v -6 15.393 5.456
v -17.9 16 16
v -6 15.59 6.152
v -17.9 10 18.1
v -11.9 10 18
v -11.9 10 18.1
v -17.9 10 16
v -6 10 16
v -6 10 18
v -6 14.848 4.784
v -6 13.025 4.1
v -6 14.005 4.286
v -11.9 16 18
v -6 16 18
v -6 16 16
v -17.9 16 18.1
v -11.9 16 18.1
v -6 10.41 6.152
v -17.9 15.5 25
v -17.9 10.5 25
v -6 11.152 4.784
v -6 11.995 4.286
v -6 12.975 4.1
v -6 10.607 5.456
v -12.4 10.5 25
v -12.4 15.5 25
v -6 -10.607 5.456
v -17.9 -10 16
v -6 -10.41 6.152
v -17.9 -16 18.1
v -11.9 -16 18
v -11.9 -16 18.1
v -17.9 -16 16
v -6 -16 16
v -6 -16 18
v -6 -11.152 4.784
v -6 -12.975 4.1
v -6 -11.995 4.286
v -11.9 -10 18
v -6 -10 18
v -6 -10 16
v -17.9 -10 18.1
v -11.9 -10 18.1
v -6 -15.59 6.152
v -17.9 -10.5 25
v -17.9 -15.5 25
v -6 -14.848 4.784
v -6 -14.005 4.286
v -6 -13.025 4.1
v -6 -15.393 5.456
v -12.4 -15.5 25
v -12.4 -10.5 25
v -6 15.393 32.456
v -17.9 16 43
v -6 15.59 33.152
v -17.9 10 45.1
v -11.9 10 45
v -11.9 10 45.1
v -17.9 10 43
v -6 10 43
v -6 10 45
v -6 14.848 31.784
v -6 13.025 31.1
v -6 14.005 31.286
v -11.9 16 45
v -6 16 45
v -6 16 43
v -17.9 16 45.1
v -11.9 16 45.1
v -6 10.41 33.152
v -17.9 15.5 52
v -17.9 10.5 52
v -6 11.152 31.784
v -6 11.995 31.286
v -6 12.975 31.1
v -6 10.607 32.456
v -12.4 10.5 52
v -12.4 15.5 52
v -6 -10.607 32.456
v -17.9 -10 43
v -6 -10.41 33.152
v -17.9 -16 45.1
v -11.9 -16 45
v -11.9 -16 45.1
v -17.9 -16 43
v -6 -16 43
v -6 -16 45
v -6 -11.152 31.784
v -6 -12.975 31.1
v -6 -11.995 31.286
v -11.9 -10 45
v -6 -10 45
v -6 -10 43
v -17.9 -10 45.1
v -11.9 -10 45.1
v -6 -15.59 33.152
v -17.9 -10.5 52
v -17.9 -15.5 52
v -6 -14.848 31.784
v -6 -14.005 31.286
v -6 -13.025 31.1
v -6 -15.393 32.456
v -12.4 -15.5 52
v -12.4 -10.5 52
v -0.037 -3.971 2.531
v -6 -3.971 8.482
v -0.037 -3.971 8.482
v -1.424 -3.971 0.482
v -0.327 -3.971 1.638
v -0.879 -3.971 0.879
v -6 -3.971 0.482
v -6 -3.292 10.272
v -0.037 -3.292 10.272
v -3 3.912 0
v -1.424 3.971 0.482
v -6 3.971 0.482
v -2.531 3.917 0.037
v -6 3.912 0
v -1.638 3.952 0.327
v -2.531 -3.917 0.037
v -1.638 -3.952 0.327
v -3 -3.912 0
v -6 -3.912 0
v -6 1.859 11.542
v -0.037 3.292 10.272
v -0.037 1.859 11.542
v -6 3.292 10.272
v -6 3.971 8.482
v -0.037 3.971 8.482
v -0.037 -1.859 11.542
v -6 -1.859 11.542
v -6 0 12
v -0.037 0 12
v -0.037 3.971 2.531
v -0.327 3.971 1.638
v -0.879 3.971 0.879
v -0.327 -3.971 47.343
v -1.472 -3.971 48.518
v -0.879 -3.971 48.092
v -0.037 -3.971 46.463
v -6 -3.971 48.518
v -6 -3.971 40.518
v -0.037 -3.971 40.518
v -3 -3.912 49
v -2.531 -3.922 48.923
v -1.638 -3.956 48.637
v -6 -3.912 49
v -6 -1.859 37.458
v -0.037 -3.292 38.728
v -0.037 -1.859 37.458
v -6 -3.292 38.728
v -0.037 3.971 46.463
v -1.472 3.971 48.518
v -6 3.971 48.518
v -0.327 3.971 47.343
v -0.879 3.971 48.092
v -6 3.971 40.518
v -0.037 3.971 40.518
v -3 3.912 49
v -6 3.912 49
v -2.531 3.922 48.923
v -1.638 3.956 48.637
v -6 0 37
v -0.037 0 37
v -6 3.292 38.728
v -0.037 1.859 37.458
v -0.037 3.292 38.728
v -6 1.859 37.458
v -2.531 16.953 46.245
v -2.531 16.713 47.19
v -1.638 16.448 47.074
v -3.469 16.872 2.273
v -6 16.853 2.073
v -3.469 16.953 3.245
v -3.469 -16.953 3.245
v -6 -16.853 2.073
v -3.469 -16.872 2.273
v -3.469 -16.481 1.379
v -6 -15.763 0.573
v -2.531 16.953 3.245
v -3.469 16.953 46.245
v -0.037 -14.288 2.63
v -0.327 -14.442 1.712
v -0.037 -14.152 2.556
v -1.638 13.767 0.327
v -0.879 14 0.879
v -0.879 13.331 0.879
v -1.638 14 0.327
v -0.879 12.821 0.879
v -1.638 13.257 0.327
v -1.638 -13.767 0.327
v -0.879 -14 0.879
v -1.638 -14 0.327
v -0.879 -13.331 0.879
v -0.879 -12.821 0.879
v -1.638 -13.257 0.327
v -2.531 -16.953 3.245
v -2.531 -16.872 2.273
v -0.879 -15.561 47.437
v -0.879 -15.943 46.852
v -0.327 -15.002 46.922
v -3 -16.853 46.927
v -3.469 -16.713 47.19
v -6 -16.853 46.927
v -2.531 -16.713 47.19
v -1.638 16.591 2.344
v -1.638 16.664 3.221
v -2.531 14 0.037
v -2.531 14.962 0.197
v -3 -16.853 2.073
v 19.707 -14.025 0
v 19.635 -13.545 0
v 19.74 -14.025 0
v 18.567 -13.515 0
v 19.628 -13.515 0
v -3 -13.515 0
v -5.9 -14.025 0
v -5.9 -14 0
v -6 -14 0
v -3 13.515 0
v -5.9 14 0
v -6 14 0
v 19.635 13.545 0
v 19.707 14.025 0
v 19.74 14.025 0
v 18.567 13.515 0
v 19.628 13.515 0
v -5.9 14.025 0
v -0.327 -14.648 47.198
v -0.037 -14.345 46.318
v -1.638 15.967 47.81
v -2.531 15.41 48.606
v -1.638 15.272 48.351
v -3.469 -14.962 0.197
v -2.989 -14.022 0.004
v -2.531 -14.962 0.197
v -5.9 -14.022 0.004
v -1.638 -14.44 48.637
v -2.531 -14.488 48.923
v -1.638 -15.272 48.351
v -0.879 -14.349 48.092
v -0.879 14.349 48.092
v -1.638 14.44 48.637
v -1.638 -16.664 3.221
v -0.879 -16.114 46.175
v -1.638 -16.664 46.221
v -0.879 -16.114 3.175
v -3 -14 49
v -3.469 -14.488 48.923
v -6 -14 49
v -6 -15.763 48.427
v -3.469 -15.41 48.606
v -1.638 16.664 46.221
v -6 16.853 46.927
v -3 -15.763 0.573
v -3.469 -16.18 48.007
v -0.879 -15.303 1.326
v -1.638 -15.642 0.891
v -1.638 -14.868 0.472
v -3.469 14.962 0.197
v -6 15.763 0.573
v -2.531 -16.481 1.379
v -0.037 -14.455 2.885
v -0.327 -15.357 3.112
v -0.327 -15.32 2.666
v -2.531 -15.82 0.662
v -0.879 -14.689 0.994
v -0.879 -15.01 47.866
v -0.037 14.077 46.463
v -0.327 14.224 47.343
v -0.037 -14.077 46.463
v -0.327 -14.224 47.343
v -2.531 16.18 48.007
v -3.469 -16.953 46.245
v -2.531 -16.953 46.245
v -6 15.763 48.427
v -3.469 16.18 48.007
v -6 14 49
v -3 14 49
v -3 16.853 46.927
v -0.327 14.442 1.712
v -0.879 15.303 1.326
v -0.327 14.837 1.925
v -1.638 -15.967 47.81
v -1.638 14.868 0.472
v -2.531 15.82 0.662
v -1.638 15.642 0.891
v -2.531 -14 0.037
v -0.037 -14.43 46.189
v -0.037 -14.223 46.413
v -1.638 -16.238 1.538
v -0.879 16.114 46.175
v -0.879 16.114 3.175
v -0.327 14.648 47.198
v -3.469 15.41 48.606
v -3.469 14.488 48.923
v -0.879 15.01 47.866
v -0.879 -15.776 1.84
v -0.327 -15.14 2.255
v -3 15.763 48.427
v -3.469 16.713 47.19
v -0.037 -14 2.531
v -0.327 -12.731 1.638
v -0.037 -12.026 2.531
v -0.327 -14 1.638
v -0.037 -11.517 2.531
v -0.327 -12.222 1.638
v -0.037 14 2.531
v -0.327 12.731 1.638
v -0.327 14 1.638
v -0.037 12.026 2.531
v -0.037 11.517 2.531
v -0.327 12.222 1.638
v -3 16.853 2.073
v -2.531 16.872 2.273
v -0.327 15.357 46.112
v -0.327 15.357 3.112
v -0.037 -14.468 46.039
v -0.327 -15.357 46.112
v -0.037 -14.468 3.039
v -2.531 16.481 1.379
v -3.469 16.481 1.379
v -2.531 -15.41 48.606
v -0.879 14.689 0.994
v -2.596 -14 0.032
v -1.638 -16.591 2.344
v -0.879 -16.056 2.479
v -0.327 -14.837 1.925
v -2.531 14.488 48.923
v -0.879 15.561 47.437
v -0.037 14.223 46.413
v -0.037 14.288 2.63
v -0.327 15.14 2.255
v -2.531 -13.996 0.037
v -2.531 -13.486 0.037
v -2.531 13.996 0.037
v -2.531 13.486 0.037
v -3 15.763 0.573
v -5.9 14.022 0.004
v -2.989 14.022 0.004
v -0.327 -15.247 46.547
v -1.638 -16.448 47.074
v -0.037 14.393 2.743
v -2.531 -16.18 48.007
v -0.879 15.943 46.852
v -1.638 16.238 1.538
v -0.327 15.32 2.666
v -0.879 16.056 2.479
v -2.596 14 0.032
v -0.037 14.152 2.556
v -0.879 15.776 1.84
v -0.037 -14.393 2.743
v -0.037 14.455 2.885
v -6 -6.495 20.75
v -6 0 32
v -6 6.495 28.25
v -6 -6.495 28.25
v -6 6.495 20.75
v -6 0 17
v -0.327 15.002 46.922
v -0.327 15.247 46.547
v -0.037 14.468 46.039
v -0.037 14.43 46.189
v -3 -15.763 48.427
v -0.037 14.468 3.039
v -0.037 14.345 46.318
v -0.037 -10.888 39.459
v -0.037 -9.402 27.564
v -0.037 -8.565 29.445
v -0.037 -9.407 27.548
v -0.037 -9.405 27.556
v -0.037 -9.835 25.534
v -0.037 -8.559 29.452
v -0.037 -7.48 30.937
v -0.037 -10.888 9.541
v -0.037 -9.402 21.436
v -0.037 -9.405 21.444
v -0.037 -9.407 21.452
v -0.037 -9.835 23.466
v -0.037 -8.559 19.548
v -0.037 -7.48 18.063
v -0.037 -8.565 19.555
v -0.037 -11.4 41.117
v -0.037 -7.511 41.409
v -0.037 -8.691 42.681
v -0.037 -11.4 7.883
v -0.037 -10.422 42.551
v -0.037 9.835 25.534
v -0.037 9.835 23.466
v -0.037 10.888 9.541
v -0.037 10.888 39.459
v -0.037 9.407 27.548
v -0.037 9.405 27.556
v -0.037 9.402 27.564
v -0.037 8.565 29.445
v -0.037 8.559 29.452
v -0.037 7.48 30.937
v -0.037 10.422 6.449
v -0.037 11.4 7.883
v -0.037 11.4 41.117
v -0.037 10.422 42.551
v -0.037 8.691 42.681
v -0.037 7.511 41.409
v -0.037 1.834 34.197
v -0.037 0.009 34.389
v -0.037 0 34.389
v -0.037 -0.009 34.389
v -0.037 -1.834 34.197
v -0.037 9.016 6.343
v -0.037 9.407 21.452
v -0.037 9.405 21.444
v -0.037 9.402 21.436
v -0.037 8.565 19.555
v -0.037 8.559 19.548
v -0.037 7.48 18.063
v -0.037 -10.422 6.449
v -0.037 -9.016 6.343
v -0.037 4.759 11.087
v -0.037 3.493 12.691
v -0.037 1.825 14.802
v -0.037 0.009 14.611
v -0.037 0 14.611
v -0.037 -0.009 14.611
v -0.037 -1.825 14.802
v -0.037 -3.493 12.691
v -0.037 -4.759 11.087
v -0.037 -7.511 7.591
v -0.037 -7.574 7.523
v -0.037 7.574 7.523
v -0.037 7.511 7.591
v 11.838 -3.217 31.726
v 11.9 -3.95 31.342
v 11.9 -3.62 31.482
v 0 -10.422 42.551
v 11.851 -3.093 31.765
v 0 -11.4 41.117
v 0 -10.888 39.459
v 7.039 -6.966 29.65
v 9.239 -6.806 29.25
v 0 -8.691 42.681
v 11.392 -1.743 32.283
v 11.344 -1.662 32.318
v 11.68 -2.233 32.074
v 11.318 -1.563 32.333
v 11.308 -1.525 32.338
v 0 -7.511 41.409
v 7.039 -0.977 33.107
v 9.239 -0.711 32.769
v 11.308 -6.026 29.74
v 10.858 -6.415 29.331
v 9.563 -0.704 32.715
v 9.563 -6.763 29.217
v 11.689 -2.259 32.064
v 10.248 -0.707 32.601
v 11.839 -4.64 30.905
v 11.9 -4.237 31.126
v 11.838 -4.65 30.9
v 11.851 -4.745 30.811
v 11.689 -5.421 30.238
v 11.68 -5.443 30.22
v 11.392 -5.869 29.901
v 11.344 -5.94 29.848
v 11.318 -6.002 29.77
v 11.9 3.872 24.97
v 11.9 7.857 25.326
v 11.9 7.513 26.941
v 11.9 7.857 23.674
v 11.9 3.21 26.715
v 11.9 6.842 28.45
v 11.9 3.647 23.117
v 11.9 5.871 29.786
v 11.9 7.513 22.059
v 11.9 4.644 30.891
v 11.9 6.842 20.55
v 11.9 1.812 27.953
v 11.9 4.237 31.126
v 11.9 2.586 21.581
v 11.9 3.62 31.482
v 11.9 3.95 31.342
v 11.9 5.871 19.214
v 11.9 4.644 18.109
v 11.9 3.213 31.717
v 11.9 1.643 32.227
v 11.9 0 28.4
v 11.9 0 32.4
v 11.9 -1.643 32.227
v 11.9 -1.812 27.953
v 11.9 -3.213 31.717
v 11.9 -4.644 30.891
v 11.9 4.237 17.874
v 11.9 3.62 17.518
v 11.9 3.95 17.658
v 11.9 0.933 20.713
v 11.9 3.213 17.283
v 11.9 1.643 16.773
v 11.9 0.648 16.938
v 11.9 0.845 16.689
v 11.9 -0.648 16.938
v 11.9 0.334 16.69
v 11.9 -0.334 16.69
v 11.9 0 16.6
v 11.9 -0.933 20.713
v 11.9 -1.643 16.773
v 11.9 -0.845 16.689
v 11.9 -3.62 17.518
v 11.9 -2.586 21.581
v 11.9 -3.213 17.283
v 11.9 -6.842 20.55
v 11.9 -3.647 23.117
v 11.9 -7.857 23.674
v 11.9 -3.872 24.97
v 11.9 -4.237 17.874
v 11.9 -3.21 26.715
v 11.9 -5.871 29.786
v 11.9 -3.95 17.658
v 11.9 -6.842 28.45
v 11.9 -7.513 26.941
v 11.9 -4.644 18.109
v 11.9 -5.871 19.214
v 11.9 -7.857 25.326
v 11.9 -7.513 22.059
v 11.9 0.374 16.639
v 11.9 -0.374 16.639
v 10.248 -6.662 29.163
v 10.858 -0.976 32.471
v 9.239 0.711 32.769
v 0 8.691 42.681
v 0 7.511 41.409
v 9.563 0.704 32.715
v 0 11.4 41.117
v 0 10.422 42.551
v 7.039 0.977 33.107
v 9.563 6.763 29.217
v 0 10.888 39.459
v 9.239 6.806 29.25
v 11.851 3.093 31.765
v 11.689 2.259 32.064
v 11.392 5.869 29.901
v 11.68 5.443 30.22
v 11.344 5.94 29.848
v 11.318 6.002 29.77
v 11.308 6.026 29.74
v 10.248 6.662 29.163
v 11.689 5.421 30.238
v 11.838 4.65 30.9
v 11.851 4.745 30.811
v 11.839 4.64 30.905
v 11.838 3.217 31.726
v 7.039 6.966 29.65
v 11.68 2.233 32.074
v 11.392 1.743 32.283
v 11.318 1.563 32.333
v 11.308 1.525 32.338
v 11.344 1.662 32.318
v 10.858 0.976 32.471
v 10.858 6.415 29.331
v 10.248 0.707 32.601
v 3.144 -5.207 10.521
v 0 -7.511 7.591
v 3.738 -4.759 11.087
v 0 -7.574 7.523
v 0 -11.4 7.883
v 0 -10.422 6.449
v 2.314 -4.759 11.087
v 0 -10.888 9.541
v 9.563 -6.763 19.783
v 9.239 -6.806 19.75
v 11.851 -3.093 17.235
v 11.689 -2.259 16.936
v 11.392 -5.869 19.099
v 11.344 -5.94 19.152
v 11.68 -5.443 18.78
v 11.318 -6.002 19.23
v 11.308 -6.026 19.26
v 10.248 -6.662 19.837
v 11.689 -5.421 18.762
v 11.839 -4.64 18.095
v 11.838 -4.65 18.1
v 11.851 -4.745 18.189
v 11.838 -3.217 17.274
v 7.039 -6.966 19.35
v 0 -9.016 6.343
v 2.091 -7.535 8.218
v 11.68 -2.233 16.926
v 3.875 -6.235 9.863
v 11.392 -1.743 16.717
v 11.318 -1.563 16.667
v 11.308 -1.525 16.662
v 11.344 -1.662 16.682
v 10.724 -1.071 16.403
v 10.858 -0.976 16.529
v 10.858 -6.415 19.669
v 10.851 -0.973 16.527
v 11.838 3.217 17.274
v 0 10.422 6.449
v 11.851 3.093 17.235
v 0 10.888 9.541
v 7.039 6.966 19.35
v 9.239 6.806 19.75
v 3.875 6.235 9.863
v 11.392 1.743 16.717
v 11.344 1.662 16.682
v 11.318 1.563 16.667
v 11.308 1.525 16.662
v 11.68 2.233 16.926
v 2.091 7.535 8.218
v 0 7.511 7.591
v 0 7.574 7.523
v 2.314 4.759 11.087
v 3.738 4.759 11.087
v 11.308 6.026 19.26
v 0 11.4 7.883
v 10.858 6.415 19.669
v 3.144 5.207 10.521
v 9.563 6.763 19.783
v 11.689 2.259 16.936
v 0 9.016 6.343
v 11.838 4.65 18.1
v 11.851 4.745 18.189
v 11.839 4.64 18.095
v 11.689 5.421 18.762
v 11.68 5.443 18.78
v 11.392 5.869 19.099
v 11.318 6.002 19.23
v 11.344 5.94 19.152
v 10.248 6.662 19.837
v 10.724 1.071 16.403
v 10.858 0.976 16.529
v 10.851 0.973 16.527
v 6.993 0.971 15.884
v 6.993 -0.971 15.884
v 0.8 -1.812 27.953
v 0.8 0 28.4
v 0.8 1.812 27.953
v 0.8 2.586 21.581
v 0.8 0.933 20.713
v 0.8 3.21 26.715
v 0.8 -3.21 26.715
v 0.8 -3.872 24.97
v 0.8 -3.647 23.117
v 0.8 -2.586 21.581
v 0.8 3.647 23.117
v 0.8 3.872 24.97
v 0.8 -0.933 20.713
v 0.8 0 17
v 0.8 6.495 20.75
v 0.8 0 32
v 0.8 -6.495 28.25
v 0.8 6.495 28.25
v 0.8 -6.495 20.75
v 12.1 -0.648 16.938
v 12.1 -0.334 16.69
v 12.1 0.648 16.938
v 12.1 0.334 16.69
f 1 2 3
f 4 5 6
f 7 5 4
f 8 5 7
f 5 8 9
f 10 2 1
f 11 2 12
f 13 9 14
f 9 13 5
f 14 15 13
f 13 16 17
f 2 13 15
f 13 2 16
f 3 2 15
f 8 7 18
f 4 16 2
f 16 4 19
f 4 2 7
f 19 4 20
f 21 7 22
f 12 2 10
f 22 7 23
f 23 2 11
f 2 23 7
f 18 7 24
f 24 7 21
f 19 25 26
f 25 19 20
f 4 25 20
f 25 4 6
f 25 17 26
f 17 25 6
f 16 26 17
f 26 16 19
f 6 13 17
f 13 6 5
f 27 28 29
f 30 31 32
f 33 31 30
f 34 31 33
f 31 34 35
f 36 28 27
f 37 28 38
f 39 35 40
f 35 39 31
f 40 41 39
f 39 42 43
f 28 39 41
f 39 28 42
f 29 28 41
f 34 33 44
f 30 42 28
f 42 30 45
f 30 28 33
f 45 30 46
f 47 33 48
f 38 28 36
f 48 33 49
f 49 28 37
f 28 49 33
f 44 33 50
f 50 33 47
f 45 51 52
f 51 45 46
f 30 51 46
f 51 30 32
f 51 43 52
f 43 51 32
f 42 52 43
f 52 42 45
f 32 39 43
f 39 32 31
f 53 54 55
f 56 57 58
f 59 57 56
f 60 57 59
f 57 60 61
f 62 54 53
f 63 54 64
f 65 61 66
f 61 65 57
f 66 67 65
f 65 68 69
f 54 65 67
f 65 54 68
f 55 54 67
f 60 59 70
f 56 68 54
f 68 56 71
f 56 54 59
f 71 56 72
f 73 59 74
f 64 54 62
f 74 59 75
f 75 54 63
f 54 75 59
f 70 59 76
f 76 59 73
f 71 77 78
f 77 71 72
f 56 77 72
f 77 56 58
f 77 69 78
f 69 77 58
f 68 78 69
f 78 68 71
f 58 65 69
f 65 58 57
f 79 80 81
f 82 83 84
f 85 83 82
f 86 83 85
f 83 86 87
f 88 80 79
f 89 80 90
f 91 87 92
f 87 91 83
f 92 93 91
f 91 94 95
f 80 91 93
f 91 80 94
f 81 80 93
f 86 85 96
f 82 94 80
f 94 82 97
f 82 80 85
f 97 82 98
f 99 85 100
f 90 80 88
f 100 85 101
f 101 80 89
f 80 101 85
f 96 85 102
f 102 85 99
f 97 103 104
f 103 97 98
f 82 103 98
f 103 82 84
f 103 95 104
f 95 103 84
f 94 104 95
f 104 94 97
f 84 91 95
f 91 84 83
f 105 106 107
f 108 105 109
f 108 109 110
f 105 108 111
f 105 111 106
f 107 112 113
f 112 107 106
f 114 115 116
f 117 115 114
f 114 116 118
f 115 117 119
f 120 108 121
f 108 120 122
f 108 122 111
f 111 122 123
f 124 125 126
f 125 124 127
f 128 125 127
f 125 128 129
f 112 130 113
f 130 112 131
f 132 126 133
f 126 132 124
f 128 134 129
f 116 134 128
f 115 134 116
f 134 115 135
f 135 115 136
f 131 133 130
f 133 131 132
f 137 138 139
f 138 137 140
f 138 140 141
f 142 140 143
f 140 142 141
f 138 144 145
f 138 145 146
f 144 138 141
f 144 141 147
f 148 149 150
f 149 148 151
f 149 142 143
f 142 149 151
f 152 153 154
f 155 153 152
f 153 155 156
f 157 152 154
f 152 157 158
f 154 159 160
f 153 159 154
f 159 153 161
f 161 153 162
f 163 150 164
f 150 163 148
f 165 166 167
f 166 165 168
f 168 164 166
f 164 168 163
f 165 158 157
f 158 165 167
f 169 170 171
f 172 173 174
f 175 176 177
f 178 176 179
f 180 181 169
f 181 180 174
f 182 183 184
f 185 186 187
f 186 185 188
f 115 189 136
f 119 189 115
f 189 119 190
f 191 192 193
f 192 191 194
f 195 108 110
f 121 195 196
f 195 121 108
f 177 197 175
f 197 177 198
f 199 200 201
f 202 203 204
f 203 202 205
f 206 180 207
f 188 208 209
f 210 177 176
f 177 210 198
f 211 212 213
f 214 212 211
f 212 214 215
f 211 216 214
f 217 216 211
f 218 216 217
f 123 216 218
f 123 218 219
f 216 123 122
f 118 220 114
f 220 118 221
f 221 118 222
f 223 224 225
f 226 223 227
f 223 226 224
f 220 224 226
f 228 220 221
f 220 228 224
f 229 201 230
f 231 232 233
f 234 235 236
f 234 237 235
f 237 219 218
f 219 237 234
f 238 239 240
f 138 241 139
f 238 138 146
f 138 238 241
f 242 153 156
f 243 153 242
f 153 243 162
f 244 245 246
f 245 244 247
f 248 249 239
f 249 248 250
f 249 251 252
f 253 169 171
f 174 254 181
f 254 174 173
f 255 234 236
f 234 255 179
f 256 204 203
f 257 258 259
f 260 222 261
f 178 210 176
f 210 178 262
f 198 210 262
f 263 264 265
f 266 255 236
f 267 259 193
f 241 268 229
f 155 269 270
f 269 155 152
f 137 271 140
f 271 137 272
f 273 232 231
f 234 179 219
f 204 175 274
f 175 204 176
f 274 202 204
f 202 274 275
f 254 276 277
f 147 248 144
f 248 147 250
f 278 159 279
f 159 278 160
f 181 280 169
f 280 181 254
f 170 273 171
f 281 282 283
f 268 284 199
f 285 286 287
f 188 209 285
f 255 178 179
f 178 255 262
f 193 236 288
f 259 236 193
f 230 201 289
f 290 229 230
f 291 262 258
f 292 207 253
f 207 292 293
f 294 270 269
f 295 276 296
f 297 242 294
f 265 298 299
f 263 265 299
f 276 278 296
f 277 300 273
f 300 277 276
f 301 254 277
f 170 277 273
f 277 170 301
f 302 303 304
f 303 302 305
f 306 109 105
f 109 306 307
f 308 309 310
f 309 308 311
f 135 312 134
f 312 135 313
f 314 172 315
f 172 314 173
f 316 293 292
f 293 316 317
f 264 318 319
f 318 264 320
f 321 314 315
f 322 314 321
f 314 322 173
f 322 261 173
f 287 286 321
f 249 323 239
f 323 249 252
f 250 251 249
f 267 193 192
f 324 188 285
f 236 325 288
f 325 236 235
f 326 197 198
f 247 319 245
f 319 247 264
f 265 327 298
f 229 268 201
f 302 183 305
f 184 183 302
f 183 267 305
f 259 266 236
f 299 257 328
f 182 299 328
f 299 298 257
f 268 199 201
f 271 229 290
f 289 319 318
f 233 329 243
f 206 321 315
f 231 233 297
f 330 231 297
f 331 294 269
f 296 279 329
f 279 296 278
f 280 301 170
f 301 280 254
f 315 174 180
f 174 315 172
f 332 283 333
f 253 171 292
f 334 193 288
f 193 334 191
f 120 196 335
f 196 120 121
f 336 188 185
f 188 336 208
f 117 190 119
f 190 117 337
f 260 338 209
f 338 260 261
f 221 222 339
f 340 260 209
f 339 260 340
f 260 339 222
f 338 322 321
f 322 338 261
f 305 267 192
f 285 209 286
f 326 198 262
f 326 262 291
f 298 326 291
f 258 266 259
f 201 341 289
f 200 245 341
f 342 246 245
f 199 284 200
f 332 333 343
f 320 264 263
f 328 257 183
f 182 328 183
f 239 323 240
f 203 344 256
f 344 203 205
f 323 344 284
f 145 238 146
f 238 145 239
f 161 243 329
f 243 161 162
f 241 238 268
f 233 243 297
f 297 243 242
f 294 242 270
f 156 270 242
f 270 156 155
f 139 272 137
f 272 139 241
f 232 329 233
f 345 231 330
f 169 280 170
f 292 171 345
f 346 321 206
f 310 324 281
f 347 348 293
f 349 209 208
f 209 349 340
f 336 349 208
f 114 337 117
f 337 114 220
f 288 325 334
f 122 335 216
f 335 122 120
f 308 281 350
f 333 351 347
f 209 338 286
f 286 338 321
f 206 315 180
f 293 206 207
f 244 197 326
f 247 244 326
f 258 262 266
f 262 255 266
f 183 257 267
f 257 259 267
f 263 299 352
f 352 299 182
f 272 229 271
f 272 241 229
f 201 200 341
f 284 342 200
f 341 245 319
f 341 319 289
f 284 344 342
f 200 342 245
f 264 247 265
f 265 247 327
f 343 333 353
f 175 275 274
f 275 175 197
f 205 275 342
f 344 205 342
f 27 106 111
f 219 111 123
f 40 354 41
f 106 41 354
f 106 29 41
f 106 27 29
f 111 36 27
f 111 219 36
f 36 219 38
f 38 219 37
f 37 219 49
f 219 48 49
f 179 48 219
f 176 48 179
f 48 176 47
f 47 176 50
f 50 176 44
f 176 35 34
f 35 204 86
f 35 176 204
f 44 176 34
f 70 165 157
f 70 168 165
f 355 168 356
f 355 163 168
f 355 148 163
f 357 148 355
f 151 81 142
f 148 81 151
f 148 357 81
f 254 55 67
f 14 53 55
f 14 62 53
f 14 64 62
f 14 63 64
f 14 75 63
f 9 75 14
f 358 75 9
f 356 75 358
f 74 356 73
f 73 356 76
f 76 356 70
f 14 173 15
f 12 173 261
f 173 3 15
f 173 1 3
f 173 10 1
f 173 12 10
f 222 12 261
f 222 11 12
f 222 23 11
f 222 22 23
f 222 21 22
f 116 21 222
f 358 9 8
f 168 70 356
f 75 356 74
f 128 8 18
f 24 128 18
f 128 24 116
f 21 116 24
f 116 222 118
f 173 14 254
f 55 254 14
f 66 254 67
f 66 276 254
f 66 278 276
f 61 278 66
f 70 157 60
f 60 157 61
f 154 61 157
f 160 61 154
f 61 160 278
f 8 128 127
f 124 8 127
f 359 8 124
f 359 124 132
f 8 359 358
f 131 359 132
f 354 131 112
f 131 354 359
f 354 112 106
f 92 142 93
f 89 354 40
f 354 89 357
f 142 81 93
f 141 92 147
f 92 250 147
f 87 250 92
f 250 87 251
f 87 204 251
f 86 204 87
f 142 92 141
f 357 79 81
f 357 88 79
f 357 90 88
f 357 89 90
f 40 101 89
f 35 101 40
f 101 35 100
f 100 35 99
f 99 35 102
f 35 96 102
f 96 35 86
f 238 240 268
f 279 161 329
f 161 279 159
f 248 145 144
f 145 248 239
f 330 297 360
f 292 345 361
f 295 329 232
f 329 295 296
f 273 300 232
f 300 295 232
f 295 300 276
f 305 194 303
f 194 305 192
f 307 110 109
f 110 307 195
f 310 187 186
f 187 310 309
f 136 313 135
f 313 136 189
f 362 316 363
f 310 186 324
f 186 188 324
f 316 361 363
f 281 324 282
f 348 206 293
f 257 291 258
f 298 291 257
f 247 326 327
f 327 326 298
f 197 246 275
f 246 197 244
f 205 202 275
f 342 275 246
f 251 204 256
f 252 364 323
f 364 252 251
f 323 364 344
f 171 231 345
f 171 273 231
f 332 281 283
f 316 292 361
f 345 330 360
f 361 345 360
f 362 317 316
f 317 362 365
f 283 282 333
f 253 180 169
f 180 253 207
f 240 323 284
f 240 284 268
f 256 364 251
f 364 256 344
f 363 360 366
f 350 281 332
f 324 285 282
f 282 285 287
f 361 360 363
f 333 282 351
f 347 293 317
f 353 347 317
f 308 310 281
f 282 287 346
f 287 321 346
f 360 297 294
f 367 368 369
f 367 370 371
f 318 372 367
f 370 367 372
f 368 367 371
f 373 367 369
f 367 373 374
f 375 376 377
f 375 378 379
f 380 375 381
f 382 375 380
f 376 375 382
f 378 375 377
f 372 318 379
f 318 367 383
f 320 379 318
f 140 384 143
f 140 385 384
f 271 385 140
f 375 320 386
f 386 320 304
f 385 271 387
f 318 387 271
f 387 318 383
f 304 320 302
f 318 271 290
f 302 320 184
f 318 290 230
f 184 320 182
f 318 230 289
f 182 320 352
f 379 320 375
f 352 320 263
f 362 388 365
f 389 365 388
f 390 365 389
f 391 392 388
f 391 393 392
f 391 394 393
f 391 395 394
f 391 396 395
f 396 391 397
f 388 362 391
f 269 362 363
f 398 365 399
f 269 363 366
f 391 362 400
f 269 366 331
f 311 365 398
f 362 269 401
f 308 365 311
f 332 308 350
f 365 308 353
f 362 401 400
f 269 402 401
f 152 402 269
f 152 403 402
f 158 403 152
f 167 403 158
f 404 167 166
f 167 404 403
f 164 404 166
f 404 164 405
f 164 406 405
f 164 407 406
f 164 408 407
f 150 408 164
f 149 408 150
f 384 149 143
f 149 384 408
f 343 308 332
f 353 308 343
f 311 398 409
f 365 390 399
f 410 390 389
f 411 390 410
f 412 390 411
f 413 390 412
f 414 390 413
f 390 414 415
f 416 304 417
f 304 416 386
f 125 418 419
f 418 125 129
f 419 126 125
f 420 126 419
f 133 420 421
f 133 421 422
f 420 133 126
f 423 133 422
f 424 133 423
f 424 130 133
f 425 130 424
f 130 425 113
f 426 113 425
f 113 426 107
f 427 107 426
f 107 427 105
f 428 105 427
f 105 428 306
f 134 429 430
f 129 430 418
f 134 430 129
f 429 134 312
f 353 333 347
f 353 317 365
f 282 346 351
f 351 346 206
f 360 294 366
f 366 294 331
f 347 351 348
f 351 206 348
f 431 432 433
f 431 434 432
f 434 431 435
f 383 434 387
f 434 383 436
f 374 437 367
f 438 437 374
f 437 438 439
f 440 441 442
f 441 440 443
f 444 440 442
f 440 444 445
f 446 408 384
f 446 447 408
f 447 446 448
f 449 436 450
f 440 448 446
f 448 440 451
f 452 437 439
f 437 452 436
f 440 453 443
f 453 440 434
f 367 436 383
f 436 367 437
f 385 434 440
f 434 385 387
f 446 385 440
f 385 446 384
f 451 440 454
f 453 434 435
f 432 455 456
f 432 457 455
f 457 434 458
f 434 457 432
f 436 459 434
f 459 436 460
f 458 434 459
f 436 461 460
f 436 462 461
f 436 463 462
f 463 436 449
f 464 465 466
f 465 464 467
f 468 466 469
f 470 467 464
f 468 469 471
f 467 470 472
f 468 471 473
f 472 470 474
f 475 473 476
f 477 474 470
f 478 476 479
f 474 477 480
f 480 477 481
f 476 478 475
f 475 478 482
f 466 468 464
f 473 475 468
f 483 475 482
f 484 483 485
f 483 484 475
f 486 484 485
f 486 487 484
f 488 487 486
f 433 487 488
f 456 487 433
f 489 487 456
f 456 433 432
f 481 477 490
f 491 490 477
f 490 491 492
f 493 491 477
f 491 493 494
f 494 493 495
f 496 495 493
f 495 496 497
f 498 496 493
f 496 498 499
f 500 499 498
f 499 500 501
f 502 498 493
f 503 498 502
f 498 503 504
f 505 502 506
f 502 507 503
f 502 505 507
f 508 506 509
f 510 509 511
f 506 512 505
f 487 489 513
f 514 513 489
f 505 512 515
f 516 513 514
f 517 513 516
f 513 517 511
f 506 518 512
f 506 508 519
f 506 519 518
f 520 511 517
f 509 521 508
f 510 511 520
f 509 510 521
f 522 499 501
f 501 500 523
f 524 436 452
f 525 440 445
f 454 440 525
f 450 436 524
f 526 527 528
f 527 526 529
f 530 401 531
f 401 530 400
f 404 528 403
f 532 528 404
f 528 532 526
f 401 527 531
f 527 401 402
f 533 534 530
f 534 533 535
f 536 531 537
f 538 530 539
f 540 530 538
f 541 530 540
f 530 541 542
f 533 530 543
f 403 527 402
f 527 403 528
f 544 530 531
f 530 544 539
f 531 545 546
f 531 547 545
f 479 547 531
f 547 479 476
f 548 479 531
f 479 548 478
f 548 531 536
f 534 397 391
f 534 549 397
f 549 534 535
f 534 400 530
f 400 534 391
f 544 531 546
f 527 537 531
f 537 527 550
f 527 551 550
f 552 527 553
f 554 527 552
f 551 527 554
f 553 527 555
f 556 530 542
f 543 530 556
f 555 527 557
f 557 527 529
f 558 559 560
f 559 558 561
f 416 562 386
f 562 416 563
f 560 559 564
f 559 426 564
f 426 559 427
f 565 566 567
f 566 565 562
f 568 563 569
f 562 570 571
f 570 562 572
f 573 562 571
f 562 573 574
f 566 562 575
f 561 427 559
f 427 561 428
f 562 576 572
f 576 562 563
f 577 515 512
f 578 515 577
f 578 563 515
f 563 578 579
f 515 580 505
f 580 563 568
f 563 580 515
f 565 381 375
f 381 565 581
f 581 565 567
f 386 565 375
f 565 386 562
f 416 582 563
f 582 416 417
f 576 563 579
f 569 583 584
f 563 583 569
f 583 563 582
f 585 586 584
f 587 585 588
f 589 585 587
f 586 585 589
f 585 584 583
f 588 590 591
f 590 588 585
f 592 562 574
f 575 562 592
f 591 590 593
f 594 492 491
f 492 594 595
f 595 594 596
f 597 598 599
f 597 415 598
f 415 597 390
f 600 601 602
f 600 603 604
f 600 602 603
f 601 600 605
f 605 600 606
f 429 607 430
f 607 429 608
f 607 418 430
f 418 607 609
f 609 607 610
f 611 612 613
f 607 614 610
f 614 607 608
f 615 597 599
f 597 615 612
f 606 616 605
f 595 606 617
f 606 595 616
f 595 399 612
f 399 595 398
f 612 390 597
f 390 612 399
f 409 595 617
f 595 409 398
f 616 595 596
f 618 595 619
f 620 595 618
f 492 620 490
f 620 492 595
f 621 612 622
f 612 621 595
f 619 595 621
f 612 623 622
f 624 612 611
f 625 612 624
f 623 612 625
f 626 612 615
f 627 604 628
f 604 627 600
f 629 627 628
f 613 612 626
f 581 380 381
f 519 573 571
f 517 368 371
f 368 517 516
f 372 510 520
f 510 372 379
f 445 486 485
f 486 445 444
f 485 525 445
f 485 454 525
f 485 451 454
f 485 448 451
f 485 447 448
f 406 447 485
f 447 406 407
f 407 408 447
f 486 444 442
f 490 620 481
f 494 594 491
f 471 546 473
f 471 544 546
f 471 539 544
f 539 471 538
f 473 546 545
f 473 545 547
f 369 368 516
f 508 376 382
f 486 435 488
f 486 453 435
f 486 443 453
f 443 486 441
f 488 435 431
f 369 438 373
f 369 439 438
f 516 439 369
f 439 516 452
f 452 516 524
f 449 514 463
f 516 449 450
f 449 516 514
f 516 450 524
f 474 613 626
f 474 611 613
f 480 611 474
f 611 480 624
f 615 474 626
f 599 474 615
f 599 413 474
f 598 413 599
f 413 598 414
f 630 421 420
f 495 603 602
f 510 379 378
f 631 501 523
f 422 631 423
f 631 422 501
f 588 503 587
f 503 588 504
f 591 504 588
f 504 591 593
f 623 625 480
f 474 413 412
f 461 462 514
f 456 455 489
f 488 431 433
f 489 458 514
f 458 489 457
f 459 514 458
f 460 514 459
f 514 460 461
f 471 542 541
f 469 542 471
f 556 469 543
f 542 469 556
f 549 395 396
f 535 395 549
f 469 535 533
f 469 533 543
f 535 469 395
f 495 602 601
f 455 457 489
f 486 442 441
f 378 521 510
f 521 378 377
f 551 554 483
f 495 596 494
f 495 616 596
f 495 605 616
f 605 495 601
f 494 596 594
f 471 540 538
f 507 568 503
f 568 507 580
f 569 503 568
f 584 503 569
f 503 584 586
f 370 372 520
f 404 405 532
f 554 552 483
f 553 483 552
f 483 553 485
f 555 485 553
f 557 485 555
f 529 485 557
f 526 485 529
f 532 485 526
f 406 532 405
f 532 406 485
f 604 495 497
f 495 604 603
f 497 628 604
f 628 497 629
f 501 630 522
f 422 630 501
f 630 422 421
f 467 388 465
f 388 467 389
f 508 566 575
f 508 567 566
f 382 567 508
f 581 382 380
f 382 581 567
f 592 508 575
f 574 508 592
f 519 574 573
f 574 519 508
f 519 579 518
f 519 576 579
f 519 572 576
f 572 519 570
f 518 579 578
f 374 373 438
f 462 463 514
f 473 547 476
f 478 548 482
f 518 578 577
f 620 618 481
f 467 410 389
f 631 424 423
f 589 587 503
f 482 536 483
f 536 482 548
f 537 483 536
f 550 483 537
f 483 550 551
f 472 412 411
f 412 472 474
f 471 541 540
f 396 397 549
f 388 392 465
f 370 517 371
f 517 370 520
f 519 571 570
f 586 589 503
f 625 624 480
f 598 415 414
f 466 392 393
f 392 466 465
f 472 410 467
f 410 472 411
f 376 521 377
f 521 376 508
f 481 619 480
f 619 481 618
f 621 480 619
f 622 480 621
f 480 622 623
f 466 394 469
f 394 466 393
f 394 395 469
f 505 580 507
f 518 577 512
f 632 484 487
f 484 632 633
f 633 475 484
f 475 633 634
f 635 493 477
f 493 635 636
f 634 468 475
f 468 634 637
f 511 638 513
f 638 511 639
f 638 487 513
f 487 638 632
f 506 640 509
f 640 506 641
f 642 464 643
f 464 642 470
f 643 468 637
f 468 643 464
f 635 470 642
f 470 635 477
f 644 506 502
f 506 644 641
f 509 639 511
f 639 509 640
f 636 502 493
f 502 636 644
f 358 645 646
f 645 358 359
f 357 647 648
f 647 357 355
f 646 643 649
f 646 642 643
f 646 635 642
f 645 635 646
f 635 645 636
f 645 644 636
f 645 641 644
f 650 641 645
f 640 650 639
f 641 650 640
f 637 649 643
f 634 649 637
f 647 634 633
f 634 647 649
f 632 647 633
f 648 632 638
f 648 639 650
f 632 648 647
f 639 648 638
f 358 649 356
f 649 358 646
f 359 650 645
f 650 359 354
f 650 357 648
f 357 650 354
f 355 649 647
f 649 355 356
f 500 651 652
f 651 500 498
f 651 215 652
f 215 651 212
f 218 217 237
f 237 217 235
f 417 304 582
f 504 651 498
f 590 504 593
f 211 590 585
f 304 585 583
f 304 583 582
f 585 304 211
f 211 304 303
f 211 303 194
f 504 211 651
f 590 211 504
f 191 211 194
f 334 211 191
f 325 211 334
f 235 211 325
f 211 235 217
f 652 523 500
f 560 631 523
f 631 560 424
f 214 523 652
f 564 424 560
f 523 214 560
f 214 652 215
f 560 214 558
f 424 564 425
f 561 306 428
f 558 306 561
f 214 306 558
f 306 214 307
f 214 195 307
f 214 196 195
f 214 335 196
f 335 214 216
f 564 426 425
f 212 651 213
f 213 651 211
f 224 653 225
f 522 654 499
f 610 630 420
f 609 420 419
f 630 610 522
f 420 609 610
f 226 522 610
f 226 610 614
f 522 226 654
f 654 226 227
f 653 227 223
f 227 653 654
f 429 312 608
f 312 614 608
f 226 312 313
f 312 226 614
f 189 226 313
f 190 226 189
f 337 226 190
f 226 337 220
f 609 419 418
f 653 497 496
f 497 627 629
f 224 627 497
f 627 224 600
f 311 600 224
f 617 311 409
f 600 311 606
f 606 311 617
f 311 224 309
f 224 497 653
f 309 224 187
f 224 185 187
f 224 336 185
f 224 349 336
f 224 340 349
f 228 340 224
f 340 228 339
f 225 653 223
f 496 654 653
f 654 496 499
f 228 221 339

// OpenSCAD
// internal diameter (make it tight)
tube_d=7.8;
// wall thickness around the rod
tube_wall_th=4;
// length of the wall around the rod
base_rod_len=12;
// nut diameter with enough freeplay
tube_nut_d=15;
// nut heigth with enough freeplay
tube_nut_h=6.7;

// optional support (zero to disable)
support_th=0.4;

/* [Hidden] */

tol=0.1+0;

hook_wall_th= 6+0;
hook_sx=12+0;
hook_dist_z=27+0;
hook_dist_y=26+0;
hook_tab_sz=14+0;
hook_notch_sx=6+0;
hook_notch_sz=5+2+0;
hook_notch_skew=0.5+0;

plate_additional_z= 8+0;

hook_plate_sy= hook_dist_y+hook_wall_th+2;
hook_plate_sz= hook_dist_z + hook_tab_sz + plate_additional_z;

module um_reel_hook_plate()
{
	module one_arm()
	{
		hull()
		{
			translate([-(hook_wall_th-1)/2,hook_wall_th/2,0])
				cylinder(r=(hook_wall_th-1)/2, h=tol, $fs=1);
			translate([0,0,hook_sx])
				cube([hook_sx, hook_wall_th, hook_tab_sz-hook_sx]);
		}

		// The notch
		translate([hook_sx-hook_notch_sx,0,hook_tab_sz])
		{
			hull()
			{
				cube([hook_notch_sx, hook_wall_th, tol]);
				translate([hook_notch_skew,hook_notch_skew,hook_notch_sz-tol])
					cube([hook_notch_sx-hook_notch_skew, hook_wall_th-hook_notch_skew*2, tol]);
			}
		}
	}

	// Hook body
	difference()
	{
		union()
		{
			// 4 hooks
			translate([hook_wall_th-tol,-hook_wall_th/2, plate_additional_z/2])
				for(z=[0,1])
					translate([0,0,z*hook_dist_z])
						for(y=[-1,+1])
							translate([0,y*hook_dist_y/2,0])
								one_arm();

			// Plate
			difference()
			{
				// Rounded main plate
				hull()
				{
					for(y=[-1,+1]) hull()
					{
						for(z=[0,+1])
						translate([0,y*(hook_plate_sy-hook_wall_th)/2, hook_wall_th/2+z*(hook_plate_sz-hook_wall_th)])
							rotate([0,90,0])
							{
								translate([0,0,hook_wall_th/2])
									sphere(r=hook_wall_th/2, $fs=1);
								translate([0,0,hook_wall_th/2])
									cylinder(r=hook_wall_th/2, h=hook_wall_th/2);
							}
					}
				}

				// Leave room for the nylock nuts (make it mountable!)
				translate([-tol,0,hook_plate_sz/2])
				for(z=[-1,+1]) scale([1,1,z])
					translate([0,0,hook_plate_sz/2])
				{
					rotate([0,90,0])
						hull()
					{
						cylinder(r=8/2, h=hook_wall_th+2*tol);
						translate([plate_additional_z,0,0])
							cylinder(r=8/2, h=hook_wall_th+2*tol);
					}
				}

			}

		}
	}
	
	// Rod mount
	translate([tol,0,hook_plate_sz/2]) rotate([0,-90,0])
	{
		cylinder(r1=min(tube_d/2,tube_nut_d/2)+tube_wall_th+2,r2=tube_d/2+tube_wall_th,h=base_rod_len);
		for(r=[30,-30,180-30,180+30]) rotate([0,0,r])
			hull()
			{
				translate([tube_d/2+tube_wall_th - tube_wall_th,0,0])
					cylinder(r=tube_wall_th,h=base_rod_len,$fs=1);
					
				translate([hook_plate_sz/2 - (tube_wall_th)*1.414,0,0])
					cylinder(r=tube_wall_th/2, h=tol);
			}
	}
}



rotate([0,0,180]) // for a better cooling when printer on an UM!!

difference()
{
	difference()
	{
		um_reel_hook_plate();
		translate([hook_wall_th+tol,0,hook_plate_sz/2])
			rotate([0,-90,0])
				cylinder(r=tube_d/2,h=base_rod_len+tube_d+2*tol);
	}
	translate([hook_wall_th - tube_nut_h - tol,0,hook_plate_sz/2])
		rotate([0,90,0])
			cylinder(r=tube_nut_d/2, h= tube_nut_h+2*tol, $fn=6);

}

// Make it printer friendly
if(support_th>0)
	intersection()
	{
		translate([-50,-50,0]) cube([100,100,100]);
		
		for(y=[-1,1]) scale([1,y,1]) translate([0,hook_plate_sy*0.4+0.96,-1]) rotate([38.3,0,0])
			translate([-hook_wall_th+tol,-support_th/2,0])
				hull()
				{
					cube([20+hook_wall_th,support_th,tol]);
					translate([0,0,hook_plate_sz/2 - tube_d/2 - tube_wall_th + 6])
						cube([base_rod_len+hook_wall_th,support_th,tol]);
				}
	}
